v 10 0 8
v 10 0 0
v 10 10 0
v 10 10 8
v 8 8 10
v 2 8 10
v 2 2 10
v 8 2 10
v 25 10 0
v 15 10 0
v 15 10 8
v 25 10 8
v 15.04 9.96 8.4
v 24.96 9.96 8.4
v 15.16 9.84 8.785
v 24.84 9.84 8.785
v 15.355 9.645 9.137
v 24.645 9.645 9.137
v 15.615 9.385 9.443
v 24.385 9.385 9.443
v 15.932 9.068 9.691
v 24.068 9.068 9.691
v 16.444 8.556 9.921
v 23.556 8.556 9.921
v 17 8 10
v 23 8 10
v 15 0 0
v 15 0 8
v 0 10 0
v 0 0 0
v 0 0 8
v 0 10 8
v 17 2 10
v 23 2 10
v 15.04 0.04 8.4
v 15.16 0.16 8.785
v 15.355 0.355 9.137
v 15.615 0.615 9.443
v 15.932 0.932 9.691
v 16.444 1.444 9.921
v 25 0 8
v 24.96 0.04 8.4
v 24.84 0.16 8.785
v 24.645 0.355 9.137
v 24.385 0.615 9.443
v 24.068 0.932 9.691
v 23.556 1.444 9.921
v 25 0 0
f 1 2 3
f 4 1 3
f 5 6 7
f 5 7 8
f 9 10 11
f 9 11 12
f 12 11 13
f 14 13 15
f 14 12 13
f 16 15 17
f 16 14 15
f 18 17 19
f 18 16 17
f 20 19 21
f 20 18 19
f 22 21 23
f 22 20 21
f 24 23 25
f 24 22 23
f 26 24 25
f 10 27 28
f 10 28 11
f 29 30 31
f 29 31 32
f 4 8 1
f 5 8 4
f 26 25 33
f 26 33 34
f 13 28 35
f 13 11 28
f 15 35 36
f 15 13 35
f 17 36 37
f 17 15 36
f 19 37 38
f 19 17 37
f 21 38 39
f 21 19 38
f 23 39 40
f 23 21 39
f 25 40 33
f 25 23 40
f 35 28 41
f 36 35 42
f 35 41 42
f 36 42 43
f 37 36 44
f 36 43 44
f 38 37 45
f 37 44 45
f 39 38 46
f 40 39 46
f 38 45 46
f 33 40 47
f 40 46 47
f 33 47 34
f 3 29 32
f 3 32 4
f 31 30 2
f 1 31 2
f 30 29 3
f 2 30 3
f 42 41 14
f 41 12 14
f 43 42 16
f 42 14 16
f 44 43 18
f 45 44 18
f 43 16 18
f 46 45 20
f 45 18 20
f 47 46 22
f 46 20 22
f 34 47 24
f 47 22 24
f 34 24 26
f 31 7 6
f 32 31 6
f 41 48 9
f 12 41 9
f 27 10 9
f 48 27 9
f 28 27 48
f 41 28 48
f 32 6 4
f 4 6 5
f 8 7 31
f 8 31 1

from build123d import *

# Parameters (mm, degrees)
BOX_W        = 10
BOX_H        = 10
BOX_DEPTH    = 10
CHAMFER_SIZE = 2
BOX001_W     = 10
BOX001_H     = 10
BOX001_DEPTH = 10
FILLET_R     = 2


with BuildPart() as chamfer_body:
    # Box → Box (new body)
    with BuildSketch(Plane.XY):
        with Locations((5, 5)):
            Rectangle(BOX_W, BOX_H)
    extrude(amount=BOX_DEPTH)

    # Chamfer
    chamfer_edges = [chamfer_body.edges().sort_by_distance(p)[0] for p in [
        (0, 5, 10),
        (10, 5, 10),
        (5, 0, 10),
        (5, 10, 10),
    ]]
    chamfer(chamfer_edges, length=CHAMFER_SIZE)


with BuildPart() as fillet_body:
    # Box001 → Box001 (new body)
    with BuildSketch(Plane(origin=(15, 0, 0), x_dir=(1, 0, 0), z_dir=(0, 0, 1))):
        with Locations((5, 5)):
            Rectangle(BOX001_W, BOX001_H)
    extrude(amount=BOX001_DEPTH)

    # Fillet
    fillet_edges = [fillet_body.edges().sort_by_distance(p)[0] for p in [
        (15, 5, 10),
        (25, 5, 10),
        (20, 0, 10),
        (20, 10, 10),
    ]]
    fillet(fillet_edges, radius=FILLET_R)


solid = Compound([chamfer_body.part, fillet_body.part])
